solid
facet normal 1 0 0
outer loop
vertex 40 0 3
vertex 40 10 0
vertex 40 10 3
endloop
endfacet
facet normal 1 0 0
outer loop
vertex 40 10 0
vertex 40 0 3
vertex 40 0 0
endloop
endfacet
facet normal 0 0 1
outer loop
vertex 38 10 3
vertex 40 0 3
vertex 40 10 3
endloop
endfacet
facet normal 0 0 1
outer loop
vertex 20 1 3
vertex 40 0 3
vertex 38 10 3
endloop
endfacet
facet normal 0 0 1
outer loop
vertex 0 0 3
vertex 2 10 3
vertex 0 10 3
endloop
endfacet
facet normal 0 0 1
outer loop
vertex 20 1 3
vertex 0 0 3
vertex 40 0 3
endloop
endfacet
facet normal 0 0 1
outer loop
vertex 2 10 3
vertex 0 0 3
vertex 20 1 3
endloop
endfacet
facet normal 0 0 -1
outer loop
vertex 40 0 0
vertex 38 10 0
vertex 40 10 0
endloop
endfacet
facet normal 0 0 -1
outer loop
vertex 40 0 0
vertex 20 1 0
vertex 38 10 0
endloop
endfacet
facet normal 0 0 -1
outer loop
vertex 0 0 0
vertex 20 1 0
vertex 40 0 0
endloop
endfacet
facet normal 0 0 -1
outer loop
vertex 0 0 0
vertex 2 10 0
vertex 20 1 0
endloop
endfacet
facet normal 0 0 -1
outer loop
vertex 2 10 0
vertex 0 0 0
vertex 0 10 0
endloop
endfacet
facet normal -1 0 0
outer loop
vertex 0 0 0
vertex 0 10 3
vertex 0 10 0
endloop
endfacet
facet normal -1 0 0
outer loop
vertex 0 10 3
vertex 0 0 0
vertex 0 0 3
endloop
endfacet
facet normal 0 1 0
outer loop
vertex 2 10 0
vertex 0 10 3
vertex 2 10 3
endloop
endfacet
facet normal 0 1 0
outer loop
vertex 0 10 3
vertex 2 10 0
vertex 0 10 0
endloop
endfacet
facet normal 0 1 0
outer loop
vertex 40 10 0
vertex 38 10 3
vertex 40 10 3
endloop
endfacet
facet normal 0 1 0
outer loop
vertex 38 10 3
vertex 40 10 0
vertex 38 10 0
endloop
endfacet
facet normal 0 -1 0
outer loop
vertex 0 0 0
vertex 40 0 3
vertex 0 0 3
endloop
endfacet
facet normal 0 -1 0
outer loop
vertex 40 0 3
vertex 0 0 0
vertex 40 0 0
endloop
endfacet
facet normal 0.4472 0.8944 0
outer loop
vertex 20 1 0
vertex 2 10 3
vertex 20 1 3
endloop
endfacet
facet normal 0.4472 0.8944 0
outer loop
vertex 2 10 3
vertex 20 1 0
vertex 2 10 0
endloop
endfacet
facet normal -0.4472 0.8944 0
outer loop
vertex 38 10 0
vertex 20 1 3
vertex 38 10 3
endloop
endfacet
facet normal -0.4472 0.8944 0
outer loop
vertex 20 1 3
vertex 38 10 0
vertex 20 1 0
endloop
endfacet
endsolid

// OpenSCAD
difference() {
	cube([40, 10, 3]);
	translate([20, 1, -1]) {
		scale([1, 0.5, 1]) {
			rotate([0, 0, 45]) {
				cube([100, 100, 5]);
			}
		}
	}
}
